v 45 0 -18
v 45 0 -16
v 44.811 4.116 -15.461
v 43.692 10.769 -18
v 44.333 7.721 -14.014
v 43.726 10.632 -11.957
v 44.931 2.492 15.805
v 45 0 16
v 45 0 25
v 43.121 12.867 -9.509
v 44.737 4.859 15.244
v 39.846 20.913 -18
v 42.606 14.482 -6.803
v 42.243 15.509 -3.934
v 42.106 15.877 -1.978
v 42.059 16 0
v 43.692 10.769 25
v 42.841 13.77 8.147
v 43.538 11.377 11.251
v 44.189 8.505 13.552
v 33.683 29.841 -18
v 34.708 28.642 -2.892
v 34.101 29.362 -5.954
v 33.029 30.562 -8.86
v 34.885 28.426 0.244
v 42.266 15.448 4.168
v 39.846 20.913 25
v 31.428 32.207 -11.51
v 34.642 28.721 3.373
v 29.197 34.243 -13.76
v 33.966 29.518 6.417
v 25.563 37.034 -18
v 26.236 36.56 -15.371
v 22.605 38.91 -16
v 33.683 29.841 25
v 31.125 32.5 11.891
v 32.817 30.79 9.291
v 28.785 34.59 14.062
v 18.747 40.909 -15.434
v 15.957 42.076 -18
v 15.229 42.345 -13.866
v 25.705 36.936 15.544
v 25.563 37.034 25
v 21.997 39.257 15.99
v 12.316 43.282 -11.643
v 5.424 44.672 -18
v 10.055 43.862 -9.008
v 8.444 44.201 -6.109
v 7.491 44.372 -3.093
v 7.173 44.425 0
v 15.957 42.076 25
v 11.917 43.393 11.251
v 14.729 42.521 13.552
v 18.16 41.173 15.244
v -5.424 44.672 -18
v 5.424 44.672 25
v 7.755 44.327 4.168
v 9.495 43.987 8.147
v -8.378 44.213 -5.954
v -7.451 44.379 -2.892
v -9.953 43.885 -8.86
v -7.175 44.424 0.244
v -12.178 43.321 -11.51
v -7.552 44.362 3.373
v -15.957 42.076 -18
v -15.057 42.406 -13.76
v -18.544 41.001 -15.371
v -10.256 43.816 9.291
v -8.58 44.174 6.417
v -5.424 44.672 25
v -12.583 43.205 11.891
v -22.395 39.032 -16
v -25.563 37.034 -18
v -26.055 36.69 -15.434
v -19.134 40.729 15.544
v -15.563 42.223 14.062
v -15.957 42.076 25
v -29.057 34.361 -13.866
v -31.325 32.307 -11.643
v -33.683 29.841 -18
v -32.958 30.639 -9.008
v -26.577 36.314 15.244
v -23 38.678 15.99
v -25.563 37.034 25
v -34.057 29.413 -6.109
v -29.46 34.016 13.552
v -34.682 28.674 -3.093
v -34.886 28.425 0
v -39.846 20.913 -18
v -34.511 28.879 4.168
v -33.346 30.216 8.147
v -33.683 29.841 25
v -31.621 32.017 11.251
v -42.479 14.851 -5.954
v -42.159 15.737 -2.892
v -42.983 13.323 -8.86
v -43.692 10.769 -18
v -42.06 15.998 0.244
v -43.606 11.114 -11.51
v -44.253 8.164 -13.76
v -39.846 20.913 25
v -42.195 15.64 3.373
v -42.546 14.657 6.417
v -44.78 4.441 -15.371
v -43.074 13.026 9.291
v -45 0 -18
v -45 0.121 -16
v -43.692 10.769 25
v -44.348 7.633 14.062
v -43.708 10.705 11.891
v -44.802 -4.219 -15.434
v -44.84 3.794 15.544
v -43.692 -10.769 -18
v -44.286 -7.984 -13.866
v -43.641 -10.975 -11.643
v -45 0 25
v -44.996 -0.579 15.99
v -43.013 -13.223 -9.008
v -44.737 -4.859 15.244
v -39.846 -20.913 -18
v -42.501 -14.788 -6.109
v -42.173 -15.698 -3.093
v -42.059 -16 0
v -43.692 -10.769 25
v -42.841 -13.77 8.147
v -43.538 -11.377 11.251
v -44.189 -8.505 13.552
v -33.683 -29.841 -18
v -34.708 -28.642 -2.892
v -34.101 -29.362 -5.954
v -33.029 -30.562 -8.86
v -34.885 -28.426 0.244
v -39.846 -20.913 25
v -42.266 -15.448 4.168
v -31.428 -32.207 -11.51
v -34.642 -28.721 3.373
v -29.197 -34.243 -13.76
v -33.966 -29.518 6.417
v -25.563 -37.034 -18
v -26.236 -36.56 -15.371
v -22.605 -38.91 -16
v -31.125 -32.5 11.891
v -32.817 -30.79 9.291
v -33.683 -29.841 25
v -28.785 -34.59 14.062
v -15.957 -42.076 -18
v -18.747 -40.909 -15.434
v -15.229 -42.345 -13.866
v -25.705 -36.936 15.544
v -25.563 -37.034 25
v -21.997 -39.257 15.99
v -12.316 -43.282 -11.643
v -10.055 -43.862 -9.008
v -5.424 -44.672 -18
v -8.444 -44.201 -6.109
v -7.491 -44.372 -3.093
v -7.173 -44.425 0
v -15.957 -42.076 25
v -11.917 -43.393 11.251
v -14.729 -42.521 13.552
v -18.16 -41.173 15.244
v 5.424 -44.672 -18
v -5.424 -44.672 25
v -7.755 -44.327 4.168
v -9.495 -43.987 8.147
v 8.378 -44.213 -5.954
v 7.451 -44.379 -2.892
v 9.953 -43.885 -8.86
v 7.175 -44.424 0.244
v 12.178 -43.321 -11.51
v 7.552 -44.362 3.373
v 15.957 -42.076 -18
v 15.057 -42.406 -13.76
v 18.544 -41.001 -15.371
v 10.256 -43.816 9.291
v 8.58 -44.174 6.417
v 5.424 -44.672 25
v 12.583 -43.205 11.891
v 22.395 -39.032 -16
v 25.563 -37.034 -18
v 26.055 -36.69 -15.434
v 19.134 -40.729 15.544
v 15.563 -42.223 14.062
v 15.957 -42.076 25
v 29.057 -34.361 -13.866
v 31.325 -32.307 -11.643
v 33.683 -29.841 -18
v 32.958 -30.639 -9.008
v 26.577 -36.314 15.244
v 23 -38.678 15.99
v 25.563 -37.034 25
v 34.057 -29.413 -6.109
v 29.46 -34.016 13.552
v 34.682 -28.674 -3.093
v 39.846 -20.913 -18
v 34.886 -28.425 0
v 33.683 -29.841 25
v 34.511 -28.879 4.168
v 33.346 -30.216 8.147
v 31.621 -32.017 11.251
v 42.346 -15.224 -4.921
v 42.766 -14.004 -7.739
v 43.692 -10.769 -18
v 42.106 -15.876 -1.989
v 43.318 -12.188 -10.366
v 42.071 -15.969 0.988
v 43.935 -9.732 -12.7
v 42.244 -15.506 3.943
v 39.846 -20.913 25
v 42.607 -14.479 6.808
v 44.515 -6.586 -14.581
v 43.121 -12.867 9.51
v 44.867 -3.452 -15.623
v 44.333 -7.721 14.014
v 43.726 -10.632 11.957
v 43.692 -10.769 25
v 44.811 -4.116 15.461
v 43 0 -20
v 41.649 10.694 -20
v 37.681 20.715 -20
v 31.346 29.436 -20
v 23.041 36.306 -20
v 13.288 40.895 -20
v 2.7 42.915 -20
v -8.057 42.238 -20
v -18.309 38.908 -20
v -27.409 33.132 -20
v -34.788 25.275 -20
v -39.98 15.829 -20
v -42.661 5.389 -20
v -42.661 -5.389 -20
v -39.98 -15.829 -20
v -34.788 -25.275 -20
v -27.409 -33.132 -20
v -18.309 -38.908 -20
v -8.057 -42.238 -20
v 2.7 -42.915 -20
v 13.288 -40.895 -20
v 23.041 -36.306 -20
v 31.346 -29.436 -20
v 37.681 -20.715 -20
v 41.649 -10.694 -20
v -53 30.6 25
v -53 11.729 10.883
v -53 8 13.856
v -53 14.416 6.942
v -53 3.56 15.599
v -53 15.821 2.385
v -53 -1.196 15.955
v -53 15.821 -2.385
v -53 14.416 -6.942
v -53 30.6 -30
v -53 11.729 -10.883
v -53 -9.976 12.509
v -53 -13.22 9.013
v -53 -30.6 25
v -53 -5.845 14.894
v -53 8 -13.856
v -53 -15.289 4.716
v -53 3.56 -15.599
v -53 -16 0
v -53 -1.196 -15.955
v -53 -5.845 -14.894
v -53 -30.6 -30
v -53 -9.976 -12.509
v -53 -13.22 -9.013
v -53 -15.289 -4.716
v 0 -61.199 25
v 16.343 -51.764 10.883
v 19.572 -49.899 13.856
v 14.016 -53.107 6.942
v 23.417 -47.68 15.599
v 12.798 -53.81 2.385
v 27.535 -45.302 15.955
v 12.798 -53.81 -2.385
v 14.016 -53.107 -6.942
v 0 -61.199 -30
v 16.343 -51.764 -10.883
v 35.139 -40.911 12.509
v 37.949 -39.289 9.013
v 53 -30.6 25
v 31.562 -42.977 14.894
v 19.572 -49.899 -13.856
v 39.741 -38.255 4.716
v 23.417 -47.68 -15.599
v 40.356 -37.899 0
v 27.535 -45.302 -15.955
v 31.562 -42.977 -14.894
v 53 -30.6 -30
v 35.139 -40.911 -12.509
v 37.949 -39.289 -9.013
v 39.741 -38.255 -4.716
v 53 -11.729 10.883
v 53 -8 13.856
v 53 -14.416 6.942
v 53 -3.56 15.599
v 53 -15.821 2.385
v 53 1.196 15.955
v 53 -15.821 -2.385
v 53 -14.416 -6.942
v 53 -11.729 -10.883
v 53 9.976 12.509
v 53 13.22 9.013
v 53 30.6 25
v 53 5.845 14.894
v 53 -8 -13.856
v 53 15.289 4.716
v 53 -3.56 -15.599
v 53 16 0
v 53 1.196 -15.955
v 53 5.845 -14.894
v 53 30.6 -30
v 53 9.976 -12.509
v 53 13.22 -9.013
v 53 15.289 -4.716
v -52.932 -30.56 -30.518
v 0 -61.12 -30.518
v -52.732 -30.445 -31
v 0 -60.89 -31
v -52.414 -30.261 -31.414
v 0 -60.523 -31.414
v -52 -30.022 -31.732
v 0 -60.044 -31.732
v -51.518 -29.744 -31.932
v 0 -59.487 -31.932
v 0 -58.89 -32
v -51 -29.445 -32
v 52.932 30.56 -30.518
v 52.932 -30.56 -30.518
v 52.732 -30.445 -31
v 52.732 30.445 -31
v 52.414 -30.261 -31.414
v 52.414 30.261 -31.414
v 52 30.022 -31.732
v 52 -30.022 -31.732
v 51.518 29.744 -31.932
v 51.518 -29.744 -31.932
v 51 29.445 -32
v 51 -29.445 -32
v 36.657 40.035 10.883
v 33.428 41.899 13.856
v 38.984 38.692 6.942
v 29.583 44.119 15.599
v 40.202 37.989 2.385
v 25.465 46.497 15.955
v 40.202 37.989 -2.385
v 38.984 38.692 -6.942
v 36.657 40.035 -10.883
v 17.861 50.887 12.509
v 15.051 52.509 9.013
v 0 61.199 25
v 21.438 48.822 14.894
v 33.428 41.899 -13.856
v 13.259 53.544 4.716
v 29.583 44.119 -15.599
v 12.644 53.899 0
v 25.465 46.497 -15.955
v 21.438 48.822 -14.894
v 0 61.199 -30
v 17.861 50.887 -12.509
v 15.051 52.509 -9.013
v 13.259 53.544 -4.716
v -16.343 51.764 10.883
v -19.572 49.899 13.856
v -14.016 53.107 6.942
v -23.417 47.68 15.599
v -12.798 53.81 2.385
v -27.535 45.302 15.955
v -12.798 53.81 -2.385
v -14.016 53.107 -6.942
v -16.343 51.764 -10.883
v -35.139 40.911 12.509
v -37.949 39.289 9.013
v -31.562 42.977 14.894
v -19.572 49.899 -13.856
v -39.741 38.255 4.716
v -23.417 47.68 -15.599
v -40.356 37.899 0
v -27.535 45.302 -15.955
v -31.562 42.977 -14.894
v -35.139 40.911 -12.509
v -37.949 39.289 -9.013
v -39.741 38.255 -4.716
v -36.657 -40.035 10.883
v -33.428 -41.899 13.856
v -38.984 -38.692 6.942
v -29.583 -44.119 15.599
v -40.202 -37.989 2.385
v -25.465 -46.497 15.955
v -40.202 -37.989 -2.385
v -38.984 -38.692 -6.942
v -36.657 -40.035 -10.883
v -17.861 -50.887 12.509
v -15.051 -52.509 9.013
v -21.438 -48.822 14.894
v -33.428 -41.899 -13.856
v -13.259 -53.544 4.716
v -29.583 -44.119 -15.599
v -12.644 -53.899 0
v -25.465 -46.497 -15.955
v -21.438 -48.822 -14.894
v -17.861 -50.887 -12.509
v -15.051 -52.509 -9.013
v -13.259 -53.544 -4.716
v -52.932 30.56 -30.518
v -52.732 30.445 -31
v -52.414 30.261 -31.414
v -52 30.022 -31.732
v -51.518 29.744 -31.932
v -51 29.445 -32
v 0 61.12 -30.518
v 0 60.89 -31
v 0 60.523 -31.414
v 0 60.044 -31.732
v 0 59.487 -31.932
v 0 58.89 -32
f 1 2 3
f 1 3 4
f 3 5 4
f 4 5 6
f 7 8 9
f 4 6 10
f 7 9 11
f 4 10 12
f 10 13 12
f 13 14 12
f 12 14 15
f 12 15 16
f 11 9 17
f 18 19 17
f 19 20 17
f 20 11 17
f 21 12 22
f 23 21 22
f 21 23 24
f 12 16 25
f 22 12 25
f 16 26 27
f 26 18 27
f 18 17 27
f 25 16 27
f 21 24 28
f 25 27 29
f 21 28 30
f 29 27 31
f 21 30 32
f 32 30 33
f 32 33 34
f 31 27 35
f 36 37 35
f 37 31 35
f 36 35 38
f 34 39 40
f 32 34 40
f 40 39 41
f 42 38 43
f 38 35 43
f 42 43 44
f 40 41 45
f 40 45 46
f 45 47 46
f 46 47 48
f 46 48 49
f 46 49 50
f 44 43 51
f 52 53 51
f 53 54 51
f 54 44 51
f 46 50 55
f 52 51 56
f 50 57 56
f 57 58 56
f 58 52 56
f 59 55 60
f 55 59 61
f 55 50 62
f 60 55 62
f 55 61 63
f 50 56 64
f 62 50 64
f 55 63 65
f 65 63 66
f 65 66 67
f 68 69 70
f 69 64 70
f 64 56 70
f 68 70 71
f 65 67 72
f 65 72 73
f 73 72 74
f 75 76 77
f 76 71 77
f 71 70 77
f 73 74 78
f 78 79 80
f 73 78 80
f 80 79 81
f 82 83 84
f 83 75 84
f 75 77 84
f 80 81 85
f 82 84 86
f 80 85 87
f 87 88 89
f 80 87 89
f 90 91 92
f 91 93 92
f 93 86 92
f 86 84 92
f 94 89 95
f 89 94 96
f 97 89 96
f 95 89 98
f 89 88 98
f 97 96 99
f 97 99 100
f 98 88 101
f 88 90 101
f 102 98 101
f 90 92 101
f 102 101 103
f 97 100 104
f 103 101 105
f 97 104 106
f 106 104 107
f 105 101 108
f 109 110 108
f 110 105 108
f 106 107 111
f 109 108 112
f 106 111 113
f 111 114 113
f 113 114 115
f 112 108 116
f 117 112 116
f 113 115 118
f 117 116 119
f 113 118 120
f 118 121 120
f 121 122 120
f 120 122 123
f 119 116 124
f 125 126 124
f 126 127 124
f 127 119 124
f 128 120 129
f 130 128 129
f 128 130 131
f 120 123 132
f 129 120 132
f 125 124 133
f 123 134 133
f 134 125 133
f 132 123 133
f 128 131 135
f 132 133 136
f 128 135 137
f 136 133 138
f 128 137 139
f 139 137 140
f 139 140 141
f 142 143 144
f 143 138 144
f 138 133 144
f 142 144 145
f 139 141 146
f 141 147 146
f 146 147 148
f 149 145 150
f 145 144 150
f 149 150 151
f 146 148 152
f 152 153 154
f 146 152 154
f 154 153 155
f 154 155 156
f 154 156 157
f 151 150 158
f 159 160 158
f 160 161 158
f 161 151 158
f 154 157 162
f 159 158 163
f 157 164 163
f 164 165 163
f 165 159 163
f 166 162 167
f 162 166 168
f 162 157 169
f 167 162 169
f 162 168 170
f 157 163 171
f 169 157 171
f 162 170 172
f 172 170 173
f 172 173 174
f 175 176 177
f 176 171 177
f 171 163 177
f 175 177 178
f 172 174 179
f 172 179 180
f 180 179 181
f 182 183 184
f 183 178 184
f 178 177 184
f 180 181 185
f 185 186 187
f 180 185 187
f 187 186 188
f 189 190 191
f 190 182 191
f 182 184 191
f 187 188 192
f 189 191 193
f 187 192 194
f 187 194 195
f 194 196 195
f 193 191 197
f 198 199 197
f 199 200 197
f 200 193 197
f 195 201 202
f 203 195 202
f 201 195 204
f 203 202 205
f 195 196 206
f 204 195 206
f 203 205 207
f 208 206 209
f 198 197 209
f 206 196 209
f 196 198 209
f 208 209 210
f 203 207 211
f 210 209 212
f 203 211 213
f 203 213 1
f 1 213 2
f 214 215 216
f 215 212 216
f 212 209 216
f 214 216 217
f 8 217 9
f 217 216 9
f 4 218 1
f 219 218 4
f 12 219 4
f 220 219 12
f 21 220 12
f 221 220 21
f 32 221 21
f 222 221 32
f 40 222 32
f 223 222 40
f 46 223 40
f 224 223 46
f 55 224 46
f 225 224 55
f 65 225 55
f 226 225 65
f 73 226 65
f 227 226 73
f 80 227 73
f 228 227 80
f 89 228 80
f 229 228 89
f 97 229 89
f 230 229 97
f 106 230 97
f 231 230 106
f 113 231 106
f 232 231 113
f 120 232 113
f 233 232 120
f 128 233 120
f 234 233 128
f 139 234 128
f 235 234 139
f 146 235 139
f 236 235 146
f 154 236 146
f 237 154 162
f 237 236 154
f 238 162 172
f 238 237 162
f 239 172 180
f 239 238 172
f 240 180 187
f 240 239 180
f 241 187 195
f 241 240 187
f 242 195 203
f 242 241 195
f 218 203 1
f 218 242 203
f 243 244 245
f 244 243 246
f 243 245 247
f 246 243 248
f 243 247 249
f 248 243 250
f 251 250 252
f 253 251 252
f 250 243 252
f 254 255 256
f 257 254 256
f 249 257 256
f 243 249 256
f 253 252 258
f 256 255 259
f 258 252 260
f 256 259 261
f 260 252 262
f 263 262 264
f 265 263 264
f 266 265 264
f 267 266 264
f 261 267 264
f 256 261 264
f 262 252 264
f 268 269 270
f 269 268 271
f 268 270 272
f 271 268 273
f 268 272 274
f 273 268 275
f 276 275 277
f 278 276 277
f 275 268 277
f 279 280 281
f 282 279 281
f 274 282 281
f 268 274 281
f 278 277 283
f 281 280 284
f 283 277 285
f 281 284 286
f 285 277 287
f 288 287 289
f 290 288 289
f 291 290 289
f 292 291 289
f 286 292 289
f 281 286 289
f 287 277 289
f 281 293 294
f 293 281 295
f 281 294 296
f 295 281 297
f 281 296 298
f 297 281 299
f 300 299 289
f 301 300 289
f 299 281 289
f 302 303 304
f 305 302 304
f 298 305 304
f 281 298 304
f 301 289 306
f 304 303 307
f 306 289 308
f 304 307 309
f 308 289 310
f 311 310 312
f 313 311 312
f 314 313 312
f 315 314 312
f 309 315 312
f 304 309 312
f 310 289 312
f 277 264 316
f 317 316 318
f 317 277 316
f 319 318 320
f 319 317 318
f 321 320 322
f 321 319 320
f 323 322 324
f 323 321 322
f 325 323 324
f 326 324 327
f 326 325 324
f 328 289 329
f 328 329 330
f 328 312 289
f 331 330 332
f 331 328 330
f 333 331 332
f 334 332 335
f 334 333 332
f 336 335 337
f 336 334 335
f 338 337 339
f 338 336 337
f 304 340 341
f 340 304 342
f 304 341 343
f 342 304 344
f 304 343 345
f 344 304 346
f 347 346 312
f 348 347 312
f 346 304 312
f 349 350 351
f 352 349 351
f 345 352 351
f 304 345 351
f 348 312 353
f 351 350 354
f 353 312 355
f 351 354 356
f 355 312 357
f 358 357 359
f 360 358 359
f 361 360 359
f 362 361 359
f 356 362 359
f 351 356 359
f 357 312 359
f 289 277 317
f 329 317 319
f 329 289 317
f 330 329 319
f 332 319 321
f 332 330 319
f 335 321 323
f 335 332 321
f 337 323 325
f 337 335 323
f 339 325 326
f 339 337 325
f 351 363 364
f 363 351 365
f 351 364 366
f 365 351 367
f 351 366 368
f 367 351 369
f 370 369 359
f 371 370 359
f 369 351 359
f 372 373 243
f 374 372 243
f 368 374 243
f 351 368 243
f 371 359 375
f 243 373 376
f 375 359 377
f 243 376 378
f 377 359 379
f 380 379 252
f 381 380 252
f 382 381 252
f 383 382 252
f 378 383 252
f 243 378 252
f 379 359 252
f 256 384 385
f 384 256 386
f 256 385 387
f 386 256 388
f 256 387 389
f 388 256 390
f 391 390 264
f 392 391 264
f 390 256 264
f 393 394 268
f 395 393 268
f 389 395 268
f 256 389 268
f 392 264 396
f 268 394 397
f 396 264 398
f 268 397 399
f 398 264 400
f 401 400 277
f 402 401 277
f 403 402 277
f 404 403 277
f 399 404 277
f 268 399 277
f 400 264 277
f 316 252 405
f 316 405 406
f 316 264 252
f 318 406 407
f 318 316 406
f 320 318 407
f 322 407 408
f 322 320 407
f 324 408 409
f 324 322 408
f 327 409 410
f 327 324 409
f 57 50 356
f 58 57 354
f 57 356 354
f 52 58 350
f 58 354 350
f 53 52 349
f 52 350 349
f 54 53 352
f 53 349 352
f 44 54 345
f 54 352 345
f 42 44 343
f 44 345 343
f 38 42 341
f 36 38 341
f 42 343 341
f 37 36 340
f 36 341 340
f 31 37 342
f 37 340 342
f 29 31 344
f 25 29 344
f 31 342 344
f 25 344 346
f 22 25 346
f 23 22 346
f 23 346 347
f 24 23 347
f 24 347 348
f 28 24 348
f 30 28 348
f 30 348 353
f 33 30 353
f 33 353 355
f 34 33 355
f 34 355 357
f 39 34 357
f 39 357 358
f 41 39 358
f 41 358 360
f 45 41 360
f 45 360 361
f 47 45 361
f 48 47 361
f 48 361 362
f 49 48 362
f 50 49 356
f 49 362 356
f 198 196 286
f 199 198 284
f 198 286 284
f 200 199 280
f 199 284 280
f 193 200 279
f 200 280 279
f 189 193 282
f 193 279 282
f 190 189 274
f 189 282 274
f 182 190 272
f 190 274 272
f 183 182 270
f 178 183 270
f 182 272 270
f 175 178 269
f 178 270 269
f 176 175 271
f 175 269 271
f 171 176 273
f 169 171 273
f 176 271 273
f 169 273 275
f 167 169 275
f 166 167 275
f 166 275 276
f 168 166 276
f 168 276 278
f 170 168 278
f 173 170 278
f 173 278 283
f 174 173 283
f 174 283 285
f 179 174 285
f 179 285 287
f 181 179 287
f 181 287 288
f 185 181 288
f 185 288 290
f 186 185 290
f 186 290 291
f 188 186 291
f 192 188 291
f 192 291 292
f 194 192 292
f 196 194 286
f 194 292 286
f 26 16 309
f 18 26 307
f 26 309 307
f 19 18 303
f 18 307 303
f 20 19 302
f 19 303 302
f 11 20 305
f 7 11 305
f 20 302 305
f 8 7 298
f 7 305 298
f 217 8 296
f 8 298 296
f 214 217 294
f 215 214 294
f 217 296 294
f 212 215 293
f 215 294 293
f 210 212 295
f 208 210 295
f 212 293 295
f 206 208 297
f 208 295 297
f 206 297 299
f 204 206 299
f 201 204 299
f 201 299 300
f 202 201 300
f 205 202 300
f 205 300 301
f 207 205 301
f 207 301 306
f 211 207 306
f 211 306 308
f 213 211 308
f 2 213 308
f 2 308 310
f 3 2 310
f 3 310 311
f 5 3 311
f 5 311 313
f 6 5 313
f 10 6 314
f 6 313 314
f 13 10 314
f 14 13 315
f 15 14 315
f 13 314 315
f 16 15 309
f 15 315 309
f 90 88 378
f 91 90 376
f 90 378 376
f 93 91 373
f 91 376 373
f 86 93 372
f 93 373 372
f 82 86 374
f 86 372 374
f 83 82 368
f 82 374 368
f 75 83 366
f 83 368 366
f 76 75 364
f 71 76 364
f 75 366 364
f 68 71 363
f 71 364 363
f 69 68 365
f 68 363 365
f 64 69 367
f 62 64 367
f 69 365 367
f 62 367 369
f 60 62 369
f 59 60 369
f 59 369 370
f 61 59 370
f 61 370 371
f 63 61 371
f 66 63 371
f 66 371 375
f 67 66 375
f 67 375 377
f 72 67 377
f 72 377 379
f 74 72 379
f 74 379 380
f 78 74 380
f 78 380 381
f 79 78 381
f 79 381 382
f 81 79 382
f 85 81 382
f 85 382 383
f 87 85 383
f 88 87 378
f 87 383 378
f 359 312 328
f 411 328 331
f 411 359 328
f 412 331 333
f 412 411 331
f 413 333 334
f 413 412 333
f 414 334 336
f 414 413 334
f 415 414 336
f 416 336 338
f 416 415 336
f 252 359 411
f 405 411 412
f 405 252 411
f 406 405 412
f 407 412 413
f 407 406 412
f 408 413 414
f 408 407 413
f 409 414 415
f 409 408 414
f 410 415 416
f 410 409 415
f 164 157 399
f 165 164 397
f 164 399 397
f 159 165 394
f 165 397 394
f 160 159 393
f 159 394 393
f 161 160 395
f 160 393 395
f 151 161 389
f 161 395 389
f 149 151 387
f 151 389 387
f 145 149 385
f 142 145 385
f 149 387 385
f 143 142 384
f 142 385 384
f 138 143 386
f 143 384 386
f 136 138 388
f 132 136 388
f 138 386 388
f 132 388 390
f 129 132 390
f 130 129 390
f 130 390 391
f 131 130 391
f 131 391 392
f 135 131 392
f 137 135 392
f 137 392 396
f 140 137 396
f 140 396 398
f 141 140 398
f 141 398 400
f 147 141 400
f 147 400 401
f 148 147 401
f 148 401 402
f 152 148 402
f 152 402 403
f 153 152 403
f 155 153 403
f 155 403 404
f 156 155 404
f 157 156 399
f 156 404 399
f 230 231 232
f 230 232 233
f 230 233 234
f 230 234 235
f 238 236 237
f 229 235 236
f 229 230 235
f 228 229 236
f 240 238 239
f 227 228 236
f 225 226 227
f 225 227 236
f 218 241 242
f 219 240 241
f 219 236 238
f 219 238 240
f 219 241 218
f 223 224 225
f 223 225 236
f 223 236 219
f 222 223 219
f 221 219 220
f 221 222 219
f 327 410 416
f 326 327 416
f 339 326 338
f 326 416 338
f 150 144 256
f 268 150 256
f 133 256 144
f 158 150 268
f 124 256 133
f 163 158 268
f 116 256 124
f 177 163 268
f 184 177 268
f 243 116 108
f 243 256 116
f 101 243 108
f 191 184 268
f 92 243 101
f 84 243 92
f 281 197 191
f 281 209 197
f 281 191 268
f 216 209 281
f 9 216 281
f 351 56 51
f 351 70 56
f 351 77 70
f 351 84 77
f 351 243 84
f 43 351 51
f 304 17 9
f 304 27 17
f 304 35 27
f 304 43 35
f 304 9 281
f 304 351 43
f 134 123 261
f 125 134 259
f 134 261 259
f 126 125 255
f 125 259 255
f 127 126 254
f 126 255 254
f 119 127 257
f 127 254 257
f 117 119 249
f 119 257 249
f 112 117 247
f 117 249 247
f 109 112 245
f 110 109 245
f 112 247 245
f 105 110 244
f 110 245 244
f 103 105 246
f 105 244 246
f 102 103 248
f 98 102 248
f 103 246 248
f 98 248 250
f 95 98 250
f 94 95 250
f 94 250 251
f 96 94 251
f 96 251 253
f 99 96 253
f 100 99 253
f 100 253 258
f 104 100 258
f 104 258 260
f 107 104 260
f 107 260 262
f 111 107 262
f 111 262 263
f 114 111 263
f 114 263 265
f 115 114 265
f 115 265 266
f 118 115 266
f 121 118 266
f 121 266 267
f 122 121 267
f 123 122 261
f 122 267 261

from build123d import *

# Parameters (mm, degrees)
BOSS_EXTRUDE1_DEPTH      = 25
BOSS_EXTRUDE1_DEPTH_BACK = 32
SKETCH2_R                = 45
CUT_EXTRUDE1_DEPTH       = 45
CUT_EXTRUDE2_REACH       = 139.165
CUT_EXTRUDE2_END_RADIUS  = 45
SKETCH3_R                = 16
CIRPATTERN1_COUNT        = 6
CHAMFER2_SIZE            = 2
FILLET1_R                = 2


with BuildPart() as part:
    # Sketch1 → Boss-Extrude1 (new, two sides: drawn at the far end of the back side and taken through both)
    with BuildSketch(Plane.XY.offset(-BOSS_EXTRUDE1_DEPTH_BACK)):
        Polygon((0, 61.199128534), (-53, 30.599564267), (-53, -30.599564267), (0, -61.199128534), (53, -30.599564267), (53, 30.599564267), align=None)
    extrude(amount=BOSS_EXTRUDE1_DEPTH + BOSS_EXTRUDE1_DEPTH_BACK)

    # Sketch2 → Cut-Extrude1 (cut)
    with BuildSketch(Plane.XY.offset(25)):
        Circle(SKETCH2_R)
    extrude(amount=-CUT_EXTRUDE1_DEPTH, mode=Mode.SUBTRACT)

    # Cut-Extrude2: up to this cylinder (the profile starts outside it)
    cut_extrude2_end = Plane(origin=(0, 0, 0), z_dir=(0, 0, 1)) * Cylinder(CUT_EXTRUDE2_END_RADIUS, 369.33, mode=Mode.PRIVATE)
    # Sketch3 → Cut-Extrude2 (cut, up to the surface)
    with BuildSketch(Plane(origin=(26.5, -45.899346401, 0), x_dir=(0.8660254037844387, 0.4999999999999999, 0), z_dir=(0.4999999999999999, -0.8660254037844387, 0)), mode=Mode.PRIVATE) as cut_extrude2_sk1:
        Circle(SKETCH3_R)
    cut_extrude2_tool1 = extrude(cut_extrude2_sk1.sketch, amount=-CUT_EXTRUDE2_REACH, mode=Mode.PRIVATE) - cut_extrude2_end
    cut_extrude2 = cut_extrude2_tool1.solids().sort_by_distance((26.5, -45.899346, 0))[0]
    add(cut_extrude2, mode=Mode.SUBTRACT)

    # CirPattern1: Cut-Extrude2 ×6 about axis
    cirpattern1_axis = Axis((0, 0, 25), (0, 0, 1))
    for i in range(1, CIRPATTERN1_COUNT):
        add(cut_extrude2.rotate(cirpattern1_axis, i * 360 / CIRPATTERN1_COUNT), mode=Mode.SUBTRACT)

    # Chamfer2
    chamfer2_edges = [part.edges().sort_by_distance(p)[0] for p in [
        (-45, 0, -20),
    ]]
    chamfer(chamfer2_edges, length=CHAMFER2_SIZE)

    # Fillet1
    fillet1_edges = [part.edges().sort_by_distance(p)[0] for p in [
        (-53, 0, -32),
        (-26.5, -45.899346401, -32),
        (26.5, -45.899346401, -32),
        (53, 0, -32),
        (26.5, 45.899346401, -32),
        (-26.5, 45.899346401, -32),
    ]]
    fillet(fillet1_edges, radius=FILLET1_R)


solid = part.part
